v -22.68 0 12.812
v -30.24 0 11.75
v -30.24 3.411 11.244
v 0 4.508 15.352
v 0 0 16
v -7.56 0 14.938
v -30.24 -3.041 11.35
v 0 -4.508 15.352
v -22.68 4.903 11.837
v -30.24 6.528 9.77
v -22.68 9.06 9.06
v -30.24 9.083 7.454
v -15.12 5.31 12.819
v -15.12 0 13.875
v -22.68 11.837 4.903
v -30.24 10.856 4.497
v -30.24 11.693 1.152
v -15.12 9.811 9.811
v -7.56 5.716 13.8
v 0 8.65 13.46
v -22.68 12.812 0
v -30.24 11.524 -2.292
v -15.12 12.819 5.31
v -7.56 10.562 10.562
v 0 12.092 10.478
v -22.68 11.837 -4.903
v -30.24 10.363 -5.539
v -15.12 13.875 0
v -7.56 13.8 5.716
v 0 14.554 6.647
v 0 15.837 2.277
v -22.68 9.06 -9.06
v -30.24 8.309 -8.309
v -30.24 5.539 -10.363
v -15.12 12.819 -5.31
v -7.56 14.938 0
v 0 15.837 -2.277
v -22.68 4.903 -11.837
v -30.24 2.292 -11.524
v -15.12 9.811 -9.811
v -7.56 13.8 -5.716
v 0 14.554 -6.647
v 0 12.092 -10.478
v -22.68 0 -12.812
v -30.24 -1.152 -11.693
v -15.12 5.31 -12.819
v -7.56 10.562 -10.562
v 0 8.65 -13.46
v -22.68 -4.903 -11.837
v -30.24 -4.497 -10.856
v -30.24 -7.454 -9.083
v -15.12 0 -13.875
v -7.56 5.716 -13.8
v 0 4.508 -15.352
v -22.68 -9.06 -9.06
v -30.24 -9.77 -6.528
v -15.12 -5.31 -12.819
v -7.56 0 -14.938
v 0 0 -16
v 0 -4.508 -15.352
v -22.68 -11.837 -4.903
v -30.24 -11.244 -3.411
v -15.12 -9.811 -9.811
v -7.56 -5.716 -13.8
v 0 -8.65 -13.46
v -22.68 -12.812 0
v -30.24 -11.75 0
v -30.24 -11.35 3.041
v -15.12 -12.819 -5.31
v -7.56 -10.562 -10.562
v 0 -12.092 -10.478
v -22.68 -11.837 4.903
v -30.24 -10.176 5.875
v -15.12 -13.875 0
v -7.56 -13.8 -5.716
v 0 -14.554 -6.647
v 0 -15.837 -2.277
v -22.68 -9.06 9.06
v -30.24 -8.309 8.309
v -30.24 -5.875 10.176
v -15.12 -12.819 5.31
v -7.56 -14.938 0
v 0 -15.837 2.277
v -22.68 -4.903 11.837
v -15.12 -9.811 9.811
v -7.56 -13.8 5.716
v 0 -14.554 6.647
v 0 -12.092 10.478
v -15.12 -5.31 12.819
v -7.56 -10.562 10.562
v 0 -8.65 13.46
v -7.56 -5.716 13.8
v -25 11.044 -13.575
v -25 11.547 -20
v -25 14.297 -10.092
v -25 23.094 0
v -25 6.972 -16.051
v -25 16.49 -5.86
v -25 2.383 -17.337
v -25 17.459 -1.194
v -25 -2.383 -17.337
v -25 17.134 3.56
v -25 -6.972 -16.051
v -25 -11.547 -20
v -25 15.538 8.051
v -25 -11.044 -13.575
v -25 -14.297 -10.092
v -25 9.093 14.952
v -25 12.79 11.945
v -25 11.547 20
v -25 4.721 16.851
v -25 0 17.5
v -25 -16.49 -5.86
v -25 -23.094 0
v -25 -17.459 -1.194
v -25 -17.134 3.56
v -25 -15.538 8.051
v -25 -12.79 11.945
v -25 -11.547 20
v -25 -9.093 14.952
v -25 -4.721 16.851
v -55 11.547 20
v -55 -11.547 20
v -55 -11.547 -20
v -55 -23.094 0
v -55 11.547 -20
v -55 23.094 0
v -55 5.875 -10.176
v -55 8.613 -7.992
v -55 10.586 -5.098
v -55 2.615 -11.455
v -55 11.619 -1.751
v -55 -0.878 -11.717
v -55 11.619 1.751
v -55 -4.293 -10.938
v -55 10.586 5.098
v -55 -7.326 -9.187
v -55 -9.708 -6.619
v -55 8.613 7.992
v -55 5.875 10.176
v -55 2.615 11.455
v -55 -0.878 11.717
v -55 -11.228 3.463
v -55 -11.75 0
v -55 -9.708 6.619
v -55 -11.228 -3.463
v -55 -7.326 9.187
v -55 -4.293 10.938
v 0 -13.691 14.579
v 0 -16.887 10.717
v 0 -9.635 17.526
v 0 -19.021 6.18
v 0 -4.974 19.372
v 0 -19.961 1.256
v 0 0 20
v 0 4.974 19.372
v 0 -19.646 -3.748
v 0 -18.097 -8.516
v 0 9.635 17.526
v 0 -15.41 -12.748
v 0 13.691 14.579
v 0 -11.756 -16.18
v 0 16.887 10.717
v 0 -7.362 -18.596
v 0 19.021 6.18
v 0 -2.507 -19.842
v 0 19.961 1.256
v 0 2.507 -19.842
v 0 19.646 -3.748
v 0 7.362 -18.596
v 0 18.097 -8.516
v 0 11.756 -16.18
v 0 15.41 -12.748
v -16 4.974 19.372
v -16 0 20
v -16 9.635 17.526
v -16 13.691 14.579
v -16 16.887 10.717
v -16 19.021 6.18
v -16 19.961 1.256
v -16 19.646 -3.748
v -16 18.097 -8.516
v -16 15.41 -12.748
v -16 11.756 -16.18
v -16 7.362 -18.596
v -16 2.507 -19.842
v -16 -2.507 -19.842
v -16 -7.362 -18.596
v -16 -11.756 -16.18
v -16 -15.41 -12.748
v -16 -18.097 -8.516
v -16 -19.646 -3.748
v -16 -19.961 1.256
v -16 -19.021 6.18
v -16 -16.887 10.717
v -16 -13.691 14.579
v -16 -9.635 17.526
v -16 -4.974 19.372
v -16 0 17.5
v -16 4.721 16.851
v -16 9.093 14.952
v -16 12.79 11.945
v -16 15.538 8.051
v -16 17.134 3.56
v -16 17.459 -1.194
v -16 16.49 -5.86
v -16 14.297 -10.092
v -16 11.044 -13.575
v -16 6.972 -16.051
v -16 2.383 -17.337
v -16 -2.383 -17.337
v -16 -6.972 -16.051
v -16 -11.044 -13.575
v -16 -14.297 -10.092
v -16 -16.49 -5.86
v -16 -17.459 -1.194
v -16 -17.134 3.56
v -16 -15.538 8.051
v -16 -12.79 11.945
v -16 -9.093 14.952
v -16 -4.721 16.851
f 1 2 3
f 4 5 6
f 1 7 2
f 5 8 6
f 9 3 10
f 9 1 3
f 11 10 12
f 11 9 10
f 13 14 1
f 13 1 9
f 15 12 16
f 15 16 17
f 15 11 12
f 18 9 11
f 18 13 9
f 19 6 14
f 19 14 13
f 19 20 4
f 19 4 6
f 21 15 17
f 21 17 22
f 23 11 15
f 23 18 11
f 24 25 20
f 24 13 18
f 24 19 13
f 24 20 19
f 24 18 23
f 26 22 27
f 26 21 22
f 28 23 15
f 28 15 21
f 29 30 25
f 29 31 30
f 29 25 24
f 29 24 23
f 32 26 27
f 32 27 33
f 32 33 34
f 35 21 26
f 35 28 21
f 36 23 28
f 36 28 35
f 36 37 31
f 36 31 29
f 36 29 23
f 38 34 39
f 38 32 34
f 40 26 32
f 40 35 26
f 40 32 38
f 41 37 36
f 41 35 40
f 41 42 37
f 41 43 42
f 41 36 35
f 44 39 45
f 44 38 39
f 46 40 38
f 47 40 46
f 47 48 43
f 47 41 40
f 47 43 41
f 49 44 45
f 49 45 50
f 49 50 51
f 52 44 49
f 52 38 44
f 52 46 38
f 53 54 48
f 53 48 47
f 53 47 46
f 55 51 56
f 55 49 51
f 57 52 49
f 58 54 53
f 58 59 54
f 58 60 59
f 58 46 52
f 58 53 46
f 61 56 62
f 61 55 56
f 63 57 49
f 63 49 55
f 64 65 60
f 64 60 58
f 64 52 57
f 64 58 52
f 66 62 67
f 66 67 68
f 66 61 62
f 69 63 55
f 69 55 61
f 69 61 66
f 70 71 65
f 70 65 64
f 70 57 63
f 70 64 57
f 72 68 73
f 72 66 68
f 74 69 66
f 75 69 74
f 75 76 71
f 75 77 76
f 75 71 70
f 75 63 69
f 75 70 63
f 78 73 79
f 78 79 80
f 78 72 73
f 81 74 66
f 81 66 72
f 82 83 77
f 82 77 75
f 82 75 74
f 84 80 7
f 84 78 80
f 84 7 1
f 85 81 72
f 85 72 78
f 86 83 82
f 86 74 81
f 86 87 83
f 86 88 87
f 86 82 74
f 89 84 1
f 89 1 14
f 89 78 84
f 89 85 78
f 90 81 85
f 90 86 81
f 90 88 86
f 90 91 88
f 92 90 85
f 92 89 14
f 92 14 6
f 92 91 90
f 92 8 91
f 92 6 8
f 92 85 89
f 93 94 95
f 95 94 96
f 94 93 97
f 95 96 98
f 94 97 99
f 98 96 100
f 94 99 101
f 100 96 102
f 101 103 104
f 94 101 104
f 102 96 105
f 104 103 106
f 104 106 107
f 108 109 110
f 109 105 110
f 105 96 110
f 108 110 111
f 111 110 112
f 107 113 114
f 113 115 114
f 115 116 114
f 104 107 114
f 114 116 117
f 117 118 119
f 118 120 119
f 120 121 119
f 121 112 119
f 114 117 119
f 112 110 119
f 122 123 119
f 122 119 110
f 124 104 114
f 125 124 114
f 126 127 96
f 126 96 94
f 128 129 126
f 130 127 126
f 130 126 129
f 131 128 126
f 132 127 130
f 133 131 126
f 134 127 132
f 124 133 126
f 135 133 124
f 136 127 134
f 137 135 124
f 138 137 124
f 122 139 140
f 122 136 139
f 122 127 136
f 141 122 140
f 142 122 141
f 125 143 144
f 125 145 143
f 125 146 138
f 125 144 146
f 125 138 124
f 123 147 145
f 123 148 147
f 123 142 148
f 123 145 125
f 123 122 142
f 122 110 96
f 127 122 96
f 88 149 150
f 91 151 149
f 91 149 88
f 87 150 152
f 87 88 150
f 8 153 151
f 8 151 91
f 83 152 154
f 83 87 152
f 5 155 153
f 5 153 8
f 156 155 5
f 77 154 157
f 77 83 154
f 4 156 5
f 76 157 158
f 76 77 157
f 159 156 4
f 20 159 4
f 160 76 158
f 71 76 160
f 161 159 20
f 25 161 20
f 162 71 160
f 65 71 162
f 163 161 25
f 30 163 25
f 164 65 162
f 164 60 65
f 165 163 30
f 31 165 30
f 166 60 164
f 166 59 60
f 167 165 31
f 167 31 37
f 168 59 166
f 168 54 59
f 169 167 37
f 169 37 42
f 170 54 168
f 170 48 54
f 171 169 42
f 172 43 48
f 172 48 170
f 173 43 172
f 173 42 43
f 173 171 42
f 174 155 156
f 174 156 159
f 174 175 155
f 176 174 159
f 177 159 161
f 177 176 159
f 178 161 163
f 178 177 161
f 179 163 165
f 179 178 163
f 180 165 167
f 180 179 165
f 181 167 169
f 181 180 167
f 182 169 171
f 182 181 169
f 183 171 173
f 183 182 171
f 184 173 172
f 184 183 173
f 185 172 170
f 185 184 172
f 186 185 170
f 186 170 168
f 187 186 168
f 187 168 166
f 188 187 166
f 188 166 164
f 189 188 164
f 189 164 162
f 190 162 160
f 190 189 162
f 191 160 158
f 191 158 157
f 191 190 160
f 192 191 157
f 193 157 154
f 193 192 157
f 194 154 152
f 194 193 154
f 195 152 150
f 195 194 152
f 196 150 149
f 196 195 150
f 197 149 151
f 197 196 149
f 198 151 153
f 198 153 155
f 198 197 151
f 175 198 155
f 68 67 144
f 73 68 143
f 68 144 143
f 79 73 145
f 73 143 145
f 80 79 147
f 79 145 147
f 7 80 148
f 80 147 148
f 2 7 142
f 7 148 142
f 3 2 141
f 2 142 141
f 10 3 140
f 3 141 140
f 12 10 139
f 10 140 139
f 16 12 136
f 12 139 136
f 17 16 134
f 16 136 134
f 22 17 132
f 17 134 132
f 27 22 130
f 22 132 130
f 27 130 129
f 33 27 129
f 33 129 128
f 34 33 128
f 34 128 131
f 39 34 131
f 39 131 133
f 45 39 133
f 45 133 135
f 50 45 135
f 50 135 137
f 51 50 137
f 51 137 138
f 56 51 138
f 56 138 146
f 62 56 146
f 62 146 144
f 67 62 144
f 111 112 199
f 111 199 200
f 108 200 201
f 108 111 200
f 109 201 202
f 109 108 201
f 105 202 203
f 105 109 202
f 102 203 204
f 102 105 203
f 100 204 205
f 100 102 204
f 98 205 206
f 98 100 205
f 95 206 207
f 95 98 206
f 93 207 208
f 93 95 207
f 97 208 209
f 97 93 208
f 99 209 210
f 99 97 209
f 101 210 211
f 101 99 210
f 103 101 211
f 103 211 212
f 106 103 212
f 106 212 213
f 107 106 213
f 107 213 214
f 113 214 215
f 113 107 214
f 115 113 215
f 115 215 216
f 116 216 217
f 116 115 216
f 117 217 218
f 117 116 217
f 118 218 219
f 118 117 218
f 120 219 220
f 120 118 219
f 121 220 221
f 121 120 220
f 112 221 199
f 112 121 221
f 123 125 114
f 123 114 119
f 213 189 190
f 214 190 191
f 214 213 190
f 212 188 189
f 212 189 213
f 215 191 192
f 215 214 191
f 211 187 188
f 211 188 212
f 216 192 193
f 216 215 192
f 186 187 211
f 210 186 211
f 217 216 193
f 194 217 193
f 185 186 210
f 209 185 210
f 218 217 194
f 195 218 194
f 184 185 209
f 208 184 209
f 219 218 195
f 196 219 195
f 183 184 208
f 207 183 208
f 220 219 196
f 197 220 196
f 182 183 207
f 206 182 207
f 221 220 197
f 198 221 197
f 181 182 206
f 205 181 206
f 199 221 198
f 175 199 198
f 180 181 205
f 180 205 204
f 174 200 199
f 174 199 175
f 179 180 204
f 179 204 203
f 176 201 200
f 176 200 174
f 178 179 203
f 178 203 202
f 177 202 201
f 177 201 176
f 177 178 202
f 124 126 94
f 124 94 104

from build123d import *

# Parameters (mm, degrees)
F2_R     = 17.5
F3_DEPTH = 30
F4_R     = 11.75
F5_DEPTH = 55.001


with BuildPart() as f1:
    # F0 (on Front) → F1 (revolve)
    with BuildSketch(Plane.XZ):
        Polygon((-55, 17.5), (-55, 0), (-36.929604, 0), (-34, 11.75), (-30.240321, 11.75), (0, 16), (0, 20), (-16, 20), (-16, 17.5), align=None)
    revolve(axis=Axis((-27.5, 0, 0), (-1, 0, 0)))

    # F2 (on face) → F3 (join)
    with BuildSketch(Plane(origin=(-55, 0, 0), x_dir=(0, -1, 0), z_dir=(-1, 0, 0))):
        Polygon((11.547005, -20), (23.094011, 0), (11.547005, 20), (-11.547005, 20), (-23.094011, 0), (-11.547005, -20), align=None)
        Circle(F2_R, mode=Mode.SUBTRACT)
    extrude(amount=-F3_DEPTH)

    # F4 (on face) → F5 (cut, through all)
    with BuildSketch(Plane(origin=(-55, 0, 0), x_dir=(0, -1, 0), z_dir=(-1, 0, 0))):
        Circle(F4_R)
    extrude(amount=-F5_DEPTH, mode=Mode.SUBTRACT)


solid = f1.part
